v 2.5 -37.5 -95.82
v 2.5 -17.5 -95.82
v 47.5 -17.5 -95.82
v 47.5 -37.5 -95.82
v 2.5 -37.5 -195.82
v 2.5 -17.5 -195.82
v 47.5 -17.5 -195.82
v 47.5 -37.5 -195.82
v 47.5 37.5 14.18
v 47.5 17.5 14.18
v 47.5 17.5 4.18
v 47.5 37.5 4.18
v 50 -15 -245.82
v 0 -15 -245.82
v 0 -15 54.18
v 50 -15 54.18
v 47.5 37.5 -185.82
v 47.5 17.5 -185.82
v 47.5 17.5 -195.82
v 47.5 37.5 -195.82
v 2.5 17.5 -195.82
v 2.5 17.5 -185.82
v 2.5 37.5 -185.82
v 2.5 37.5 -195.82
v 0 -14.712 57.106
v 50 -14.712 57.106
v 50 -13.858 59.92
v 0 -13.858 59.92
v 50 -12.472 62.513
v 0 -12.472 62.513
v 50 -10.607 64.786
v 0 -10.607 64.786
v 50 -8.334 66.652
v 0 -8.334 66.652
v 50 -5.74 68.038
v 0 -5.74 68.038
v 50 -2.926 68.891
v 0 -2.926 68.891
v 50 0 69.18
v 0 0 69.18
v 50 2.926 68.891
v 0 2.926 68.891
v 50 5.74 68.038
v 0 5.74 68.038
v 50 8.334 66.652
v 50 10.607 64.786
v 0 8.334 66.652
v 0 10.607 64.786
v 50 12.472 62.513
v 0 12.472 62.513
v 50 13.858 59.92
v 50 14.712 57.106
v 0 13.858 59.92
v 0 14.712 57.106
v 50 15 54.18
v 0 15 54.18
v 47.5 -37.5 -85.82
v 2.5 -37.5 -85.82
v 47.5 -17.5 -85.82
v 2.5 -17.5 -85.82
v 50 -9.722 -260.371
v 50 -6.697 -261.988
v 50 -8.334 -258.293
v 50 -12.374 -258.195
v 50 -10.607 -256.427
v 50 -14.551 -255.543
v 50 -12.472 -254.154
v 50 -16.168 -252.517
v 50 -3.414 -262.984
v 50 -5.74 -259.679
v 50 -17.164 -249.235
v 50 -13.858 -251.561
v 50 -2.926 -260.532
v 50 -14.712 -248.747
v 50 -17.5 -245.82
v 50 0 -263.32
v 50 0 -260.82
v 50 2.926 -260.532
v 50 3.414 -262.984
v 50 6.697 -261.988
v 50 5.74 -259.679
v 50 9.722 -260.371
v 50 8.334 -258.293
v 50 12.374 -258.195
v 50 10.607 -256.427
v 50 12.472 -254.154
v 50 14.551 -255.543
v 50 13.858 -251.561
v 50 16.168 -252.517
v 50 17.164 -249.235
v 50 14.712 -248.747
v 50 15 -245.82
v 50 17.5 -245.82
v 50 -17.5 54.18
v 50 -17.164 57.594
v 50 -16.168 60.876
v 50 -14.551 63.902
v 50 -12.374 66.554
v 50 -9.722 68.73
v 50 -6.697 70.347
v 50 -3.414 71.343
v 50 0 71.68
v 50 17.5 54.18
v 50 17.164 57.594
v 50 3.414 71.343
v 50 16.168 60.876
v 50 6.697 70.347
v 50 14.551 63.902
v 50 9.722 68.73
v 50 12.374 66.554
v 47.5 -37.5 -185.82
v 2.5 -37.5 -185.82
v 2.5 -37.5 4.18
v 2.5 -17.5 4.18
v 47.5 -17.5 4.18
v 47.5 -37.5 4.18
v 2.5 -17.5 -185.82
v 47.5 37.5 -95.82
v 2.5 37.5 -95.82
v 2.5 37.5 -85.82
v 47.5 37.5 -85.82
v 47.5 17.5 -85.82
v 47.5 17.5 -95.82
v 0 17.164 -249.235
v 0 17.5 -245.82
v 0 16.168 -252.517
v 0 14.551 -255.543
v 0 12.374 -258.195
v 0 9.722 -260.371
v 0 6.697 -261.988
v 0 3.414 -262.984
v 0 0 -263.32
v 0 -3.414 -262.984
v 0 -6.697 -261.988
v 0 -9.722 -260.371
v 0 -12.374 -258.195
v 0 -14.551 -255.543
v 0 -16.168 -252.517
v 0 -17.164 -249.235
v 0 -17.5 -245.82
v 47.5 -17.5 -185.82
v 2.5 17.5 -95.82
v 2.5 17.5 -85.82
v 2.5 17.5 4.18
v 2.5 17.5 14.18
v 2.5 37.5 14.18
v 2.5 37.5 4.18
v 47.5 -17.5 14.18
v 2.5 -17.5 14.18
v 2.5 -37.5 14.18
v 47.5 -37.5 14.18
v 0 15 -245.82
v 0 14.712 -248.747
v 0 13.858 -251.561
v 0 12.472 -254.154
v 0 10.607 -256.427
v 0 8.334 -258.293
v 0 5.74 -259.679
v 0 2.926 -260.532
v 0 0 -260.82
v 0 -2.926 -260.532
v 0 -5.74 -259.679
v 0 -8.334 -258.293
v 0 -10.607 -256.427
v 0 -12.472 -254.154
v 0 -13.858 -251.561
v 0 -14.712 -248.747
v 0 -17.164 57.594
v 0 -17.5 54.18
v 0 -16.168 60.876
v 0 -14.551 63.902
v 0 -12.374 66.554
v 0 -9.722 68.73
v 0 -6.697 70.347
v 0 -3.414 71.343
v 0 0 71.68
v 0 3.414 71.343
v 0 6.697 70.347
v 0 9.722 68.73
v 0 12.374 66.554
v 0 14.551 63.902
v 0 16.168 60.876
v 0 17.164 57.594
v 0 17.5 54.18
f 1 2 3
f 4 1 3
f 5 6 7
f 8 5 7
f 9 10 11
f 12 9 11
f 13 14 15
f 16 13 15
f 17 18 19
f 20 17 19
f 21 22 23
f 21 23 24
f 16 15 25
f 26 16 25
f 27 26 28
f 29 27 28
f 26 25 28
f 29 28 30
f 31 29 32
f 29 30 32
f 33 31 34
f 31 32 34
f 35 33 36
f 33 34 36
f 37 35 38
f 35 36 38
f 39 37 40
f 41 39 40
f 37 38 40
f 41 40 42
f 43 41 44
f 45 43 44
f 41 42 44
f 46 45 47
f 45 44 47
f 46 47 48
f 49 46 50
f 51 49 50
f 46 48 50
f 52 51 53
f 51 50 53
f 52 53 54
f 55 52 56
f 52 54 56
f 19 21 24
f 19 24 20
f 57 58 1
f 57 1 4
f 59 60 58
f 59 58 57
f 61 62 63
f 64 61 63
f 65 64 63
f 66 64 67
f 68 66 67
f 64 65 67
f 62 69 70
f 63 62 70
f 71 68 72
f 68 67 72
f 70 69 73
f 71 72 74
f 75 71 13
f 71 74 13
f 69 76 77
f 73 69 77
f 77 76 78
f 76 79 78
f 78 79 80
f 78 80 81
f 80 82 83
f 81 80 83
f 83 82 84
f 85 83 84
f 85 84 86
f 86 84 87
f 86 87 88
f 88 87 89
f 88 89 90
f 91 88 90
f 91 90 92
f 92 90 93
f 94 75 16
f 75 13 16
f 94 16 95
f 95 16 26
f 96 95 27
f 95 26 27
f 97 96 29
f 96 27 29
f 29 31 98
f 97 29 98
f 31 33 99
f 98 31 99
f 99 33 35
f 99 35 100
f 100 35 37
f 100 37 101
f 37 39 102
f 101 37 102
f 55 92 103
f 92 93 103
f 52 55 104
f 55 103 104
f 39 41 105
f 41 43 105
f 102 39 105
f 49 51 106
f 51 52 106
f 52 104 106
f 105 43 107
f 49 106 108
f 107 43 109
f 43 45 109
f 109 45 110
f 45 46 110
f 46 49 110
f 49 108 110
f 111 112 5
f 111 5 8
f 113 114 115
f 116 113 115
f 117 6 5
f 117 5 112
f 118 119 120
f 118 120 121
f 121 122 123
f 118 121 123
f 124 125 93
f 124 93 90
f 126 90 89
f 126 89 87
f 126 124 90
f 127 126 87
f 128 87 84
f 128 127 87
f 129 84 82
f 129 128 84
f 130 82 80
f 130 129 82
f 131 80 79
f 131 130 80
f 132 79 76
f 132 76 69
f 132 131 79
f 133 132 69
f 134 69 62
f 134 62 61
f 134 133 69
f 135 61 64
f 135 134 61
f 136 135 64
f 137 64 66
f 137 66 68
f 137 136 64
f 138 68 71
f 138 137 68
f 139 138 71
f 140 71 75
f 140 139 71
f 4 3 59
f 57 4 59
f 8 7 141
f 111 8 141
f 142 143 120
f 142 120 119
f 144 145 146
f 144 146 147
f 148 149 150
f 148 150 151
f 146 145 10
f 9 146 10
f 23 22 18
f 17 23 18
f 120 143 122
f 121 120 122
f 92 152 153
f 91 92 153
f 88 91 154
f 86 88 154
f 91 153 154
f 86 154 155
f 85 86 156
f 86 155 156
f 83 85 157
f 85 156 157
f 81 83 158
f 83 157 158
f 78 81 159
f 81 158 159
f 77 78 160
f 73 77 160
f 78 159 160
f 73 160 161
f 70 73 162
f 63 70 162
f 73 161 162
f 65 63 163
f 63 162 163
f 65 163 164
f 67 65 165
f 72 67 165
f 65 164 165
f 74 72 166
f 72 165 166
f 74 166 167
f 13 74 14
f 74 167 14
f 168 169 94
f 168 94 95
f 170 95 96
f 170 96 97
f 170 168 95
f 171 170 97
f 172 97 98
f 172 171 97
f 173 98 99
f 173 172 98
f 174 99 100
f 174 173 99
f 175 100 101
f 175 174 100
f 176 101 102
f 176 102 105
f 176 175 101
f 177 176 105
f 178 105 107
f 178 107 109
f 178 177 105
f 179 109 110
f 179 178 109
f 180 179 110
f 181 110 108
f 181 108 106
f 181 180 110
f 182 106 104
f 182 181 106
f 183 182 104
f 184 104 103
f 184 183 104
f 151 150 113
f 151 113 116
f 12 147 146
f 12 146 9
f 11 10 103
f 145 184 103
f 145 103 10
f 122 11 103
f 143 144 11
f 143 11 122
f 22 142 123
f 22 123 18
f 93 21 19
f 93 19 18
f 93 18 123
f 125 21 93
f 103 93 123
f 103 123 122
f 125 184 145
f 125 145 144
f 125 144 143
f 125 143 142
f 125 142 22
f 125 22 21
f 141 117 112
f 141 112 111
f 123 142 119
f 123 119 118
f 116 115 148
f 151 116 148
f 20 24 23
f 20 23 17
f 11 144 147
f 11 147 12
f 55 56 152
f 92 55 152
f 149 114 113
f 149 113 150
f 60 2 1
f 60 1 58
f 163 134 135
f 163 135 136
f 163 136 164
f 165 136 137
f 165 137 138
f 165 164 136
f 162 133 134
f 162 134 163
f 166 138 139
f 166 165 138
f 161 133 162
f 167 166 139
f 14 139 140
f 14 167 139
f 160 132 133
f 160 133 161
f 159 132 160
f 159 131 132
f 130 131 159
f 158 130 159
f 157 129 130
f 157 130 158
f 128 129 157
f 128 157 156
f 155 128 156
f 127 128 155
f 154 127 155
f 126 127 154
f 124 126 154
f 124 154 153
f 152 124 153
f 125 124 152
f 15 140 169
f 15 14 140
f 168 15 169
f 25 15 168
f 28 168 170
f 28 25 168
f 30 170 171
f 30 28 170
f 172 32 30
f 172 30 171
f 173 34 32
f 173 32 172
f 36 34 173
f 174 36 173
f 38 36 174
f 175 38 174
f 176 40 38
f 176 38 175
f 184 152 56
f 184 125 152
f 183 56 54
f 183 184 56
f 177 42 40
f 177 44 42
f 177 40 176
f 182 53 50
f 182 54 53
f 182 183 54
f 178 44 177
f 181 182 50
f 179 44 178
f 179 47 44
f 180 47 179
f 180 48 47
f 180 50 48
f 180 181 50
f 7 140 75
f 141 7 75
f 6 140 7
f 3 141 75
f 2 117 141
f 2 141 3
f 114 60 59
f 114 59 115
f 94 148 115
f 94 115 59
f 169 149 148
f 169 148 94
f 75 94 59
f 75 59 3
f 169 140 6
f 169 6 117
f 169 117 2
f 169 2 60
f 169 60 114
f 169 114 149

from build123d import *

# Parameters (mm, degrees)
SALIENTE_EXTRUIR1_DEPTH = 50
CROQUIS2_W              = 45
CROQUIS2_H              = 10
SALIENTE_EXTRUIR2_DEPTH = 20
CROQUIS3_W              = 45
CROQUIS3_H              = 10
SALIENTE_EXTRUIR3_DEPTH = 20


with BuildPart() as part:
    # Croquis1 → Saliente-Extruir1 (new body)
    with BuildSketch(Plane(origin=(0, 0, 0), x_dir=(0, 0, -1), z_dir=(1, 0, 0))):
        with BuildLine():
            Line((-54.179530832, 17.5), (245.820469168, 17.5))
            ThreePointArc((245.820469168, 17.5), (263.320469168, 0), (245.820469168, -17.5))
            Line((245.820469168, -17.5), (-54.179530832, -17.5))
            ThreePointArc((-54.179530832, -17.5), (-71.679530832, 0), (-54.179530832, 17.5))
        make_face()
        with BuildLine():
            Line((-54.179530832, 15), (245.820469168, 15))
            ThreePointArc((245.820469168, 15), (260.820469168, 0), (245.820469168, -15))
            Line((245.820469168, -15), (-54.179530832, -15))
            ThreePointArc((-54.179530832, -15), (-69.179530832, 0), (-54.179530832, 15))
        make_face(mode=Mode.SUBTRACT)
    extrude(amount=SALIENTE_EXTRUIR1_DEPTH)

    # Croquis2 → Saliente-Extruir2 (add)
    with BuildSketch(Plane(origin=(0, 17.5, 0), x_dir=(1, 0, 0), z_dir=(0, 1, 0))):
        with Locations((25, 190.820469168)):
            Rectangle(CROQUIS2_W, CROQUIS2_H)
        with Locations((25, 90.820469168)):
            Rectangle(CROQUIS2_W, CROQUIS2_H)
        with Locations((25, -9.179530832)):
            Rectangle(CROQUIS2_W, CROQUIS2_H)
    extrude(amount=SALIENTE_EXTRUIR2_DEPTH)

    # Croquis3 → Saliente-Extruir3 (add)
    with BuildSketch(Plane.XZ.offset(17.5)):
        with Locations((25, -190.820469168)):
            Rectangle(CROQUIS3_W, CROQUIS3_H)
        with Locations((25, -90.820469168)):
            Rectangle(CROQUIS3_W, CROQUIS3_H)
        with Locations((25, 9.179530832)):
            Rectangle(CROQUIS3_W, CROQUIS3_H)
    extrude(amount=SALIENTE_EXTRUIR3_DEPTH)


solid = part.part
